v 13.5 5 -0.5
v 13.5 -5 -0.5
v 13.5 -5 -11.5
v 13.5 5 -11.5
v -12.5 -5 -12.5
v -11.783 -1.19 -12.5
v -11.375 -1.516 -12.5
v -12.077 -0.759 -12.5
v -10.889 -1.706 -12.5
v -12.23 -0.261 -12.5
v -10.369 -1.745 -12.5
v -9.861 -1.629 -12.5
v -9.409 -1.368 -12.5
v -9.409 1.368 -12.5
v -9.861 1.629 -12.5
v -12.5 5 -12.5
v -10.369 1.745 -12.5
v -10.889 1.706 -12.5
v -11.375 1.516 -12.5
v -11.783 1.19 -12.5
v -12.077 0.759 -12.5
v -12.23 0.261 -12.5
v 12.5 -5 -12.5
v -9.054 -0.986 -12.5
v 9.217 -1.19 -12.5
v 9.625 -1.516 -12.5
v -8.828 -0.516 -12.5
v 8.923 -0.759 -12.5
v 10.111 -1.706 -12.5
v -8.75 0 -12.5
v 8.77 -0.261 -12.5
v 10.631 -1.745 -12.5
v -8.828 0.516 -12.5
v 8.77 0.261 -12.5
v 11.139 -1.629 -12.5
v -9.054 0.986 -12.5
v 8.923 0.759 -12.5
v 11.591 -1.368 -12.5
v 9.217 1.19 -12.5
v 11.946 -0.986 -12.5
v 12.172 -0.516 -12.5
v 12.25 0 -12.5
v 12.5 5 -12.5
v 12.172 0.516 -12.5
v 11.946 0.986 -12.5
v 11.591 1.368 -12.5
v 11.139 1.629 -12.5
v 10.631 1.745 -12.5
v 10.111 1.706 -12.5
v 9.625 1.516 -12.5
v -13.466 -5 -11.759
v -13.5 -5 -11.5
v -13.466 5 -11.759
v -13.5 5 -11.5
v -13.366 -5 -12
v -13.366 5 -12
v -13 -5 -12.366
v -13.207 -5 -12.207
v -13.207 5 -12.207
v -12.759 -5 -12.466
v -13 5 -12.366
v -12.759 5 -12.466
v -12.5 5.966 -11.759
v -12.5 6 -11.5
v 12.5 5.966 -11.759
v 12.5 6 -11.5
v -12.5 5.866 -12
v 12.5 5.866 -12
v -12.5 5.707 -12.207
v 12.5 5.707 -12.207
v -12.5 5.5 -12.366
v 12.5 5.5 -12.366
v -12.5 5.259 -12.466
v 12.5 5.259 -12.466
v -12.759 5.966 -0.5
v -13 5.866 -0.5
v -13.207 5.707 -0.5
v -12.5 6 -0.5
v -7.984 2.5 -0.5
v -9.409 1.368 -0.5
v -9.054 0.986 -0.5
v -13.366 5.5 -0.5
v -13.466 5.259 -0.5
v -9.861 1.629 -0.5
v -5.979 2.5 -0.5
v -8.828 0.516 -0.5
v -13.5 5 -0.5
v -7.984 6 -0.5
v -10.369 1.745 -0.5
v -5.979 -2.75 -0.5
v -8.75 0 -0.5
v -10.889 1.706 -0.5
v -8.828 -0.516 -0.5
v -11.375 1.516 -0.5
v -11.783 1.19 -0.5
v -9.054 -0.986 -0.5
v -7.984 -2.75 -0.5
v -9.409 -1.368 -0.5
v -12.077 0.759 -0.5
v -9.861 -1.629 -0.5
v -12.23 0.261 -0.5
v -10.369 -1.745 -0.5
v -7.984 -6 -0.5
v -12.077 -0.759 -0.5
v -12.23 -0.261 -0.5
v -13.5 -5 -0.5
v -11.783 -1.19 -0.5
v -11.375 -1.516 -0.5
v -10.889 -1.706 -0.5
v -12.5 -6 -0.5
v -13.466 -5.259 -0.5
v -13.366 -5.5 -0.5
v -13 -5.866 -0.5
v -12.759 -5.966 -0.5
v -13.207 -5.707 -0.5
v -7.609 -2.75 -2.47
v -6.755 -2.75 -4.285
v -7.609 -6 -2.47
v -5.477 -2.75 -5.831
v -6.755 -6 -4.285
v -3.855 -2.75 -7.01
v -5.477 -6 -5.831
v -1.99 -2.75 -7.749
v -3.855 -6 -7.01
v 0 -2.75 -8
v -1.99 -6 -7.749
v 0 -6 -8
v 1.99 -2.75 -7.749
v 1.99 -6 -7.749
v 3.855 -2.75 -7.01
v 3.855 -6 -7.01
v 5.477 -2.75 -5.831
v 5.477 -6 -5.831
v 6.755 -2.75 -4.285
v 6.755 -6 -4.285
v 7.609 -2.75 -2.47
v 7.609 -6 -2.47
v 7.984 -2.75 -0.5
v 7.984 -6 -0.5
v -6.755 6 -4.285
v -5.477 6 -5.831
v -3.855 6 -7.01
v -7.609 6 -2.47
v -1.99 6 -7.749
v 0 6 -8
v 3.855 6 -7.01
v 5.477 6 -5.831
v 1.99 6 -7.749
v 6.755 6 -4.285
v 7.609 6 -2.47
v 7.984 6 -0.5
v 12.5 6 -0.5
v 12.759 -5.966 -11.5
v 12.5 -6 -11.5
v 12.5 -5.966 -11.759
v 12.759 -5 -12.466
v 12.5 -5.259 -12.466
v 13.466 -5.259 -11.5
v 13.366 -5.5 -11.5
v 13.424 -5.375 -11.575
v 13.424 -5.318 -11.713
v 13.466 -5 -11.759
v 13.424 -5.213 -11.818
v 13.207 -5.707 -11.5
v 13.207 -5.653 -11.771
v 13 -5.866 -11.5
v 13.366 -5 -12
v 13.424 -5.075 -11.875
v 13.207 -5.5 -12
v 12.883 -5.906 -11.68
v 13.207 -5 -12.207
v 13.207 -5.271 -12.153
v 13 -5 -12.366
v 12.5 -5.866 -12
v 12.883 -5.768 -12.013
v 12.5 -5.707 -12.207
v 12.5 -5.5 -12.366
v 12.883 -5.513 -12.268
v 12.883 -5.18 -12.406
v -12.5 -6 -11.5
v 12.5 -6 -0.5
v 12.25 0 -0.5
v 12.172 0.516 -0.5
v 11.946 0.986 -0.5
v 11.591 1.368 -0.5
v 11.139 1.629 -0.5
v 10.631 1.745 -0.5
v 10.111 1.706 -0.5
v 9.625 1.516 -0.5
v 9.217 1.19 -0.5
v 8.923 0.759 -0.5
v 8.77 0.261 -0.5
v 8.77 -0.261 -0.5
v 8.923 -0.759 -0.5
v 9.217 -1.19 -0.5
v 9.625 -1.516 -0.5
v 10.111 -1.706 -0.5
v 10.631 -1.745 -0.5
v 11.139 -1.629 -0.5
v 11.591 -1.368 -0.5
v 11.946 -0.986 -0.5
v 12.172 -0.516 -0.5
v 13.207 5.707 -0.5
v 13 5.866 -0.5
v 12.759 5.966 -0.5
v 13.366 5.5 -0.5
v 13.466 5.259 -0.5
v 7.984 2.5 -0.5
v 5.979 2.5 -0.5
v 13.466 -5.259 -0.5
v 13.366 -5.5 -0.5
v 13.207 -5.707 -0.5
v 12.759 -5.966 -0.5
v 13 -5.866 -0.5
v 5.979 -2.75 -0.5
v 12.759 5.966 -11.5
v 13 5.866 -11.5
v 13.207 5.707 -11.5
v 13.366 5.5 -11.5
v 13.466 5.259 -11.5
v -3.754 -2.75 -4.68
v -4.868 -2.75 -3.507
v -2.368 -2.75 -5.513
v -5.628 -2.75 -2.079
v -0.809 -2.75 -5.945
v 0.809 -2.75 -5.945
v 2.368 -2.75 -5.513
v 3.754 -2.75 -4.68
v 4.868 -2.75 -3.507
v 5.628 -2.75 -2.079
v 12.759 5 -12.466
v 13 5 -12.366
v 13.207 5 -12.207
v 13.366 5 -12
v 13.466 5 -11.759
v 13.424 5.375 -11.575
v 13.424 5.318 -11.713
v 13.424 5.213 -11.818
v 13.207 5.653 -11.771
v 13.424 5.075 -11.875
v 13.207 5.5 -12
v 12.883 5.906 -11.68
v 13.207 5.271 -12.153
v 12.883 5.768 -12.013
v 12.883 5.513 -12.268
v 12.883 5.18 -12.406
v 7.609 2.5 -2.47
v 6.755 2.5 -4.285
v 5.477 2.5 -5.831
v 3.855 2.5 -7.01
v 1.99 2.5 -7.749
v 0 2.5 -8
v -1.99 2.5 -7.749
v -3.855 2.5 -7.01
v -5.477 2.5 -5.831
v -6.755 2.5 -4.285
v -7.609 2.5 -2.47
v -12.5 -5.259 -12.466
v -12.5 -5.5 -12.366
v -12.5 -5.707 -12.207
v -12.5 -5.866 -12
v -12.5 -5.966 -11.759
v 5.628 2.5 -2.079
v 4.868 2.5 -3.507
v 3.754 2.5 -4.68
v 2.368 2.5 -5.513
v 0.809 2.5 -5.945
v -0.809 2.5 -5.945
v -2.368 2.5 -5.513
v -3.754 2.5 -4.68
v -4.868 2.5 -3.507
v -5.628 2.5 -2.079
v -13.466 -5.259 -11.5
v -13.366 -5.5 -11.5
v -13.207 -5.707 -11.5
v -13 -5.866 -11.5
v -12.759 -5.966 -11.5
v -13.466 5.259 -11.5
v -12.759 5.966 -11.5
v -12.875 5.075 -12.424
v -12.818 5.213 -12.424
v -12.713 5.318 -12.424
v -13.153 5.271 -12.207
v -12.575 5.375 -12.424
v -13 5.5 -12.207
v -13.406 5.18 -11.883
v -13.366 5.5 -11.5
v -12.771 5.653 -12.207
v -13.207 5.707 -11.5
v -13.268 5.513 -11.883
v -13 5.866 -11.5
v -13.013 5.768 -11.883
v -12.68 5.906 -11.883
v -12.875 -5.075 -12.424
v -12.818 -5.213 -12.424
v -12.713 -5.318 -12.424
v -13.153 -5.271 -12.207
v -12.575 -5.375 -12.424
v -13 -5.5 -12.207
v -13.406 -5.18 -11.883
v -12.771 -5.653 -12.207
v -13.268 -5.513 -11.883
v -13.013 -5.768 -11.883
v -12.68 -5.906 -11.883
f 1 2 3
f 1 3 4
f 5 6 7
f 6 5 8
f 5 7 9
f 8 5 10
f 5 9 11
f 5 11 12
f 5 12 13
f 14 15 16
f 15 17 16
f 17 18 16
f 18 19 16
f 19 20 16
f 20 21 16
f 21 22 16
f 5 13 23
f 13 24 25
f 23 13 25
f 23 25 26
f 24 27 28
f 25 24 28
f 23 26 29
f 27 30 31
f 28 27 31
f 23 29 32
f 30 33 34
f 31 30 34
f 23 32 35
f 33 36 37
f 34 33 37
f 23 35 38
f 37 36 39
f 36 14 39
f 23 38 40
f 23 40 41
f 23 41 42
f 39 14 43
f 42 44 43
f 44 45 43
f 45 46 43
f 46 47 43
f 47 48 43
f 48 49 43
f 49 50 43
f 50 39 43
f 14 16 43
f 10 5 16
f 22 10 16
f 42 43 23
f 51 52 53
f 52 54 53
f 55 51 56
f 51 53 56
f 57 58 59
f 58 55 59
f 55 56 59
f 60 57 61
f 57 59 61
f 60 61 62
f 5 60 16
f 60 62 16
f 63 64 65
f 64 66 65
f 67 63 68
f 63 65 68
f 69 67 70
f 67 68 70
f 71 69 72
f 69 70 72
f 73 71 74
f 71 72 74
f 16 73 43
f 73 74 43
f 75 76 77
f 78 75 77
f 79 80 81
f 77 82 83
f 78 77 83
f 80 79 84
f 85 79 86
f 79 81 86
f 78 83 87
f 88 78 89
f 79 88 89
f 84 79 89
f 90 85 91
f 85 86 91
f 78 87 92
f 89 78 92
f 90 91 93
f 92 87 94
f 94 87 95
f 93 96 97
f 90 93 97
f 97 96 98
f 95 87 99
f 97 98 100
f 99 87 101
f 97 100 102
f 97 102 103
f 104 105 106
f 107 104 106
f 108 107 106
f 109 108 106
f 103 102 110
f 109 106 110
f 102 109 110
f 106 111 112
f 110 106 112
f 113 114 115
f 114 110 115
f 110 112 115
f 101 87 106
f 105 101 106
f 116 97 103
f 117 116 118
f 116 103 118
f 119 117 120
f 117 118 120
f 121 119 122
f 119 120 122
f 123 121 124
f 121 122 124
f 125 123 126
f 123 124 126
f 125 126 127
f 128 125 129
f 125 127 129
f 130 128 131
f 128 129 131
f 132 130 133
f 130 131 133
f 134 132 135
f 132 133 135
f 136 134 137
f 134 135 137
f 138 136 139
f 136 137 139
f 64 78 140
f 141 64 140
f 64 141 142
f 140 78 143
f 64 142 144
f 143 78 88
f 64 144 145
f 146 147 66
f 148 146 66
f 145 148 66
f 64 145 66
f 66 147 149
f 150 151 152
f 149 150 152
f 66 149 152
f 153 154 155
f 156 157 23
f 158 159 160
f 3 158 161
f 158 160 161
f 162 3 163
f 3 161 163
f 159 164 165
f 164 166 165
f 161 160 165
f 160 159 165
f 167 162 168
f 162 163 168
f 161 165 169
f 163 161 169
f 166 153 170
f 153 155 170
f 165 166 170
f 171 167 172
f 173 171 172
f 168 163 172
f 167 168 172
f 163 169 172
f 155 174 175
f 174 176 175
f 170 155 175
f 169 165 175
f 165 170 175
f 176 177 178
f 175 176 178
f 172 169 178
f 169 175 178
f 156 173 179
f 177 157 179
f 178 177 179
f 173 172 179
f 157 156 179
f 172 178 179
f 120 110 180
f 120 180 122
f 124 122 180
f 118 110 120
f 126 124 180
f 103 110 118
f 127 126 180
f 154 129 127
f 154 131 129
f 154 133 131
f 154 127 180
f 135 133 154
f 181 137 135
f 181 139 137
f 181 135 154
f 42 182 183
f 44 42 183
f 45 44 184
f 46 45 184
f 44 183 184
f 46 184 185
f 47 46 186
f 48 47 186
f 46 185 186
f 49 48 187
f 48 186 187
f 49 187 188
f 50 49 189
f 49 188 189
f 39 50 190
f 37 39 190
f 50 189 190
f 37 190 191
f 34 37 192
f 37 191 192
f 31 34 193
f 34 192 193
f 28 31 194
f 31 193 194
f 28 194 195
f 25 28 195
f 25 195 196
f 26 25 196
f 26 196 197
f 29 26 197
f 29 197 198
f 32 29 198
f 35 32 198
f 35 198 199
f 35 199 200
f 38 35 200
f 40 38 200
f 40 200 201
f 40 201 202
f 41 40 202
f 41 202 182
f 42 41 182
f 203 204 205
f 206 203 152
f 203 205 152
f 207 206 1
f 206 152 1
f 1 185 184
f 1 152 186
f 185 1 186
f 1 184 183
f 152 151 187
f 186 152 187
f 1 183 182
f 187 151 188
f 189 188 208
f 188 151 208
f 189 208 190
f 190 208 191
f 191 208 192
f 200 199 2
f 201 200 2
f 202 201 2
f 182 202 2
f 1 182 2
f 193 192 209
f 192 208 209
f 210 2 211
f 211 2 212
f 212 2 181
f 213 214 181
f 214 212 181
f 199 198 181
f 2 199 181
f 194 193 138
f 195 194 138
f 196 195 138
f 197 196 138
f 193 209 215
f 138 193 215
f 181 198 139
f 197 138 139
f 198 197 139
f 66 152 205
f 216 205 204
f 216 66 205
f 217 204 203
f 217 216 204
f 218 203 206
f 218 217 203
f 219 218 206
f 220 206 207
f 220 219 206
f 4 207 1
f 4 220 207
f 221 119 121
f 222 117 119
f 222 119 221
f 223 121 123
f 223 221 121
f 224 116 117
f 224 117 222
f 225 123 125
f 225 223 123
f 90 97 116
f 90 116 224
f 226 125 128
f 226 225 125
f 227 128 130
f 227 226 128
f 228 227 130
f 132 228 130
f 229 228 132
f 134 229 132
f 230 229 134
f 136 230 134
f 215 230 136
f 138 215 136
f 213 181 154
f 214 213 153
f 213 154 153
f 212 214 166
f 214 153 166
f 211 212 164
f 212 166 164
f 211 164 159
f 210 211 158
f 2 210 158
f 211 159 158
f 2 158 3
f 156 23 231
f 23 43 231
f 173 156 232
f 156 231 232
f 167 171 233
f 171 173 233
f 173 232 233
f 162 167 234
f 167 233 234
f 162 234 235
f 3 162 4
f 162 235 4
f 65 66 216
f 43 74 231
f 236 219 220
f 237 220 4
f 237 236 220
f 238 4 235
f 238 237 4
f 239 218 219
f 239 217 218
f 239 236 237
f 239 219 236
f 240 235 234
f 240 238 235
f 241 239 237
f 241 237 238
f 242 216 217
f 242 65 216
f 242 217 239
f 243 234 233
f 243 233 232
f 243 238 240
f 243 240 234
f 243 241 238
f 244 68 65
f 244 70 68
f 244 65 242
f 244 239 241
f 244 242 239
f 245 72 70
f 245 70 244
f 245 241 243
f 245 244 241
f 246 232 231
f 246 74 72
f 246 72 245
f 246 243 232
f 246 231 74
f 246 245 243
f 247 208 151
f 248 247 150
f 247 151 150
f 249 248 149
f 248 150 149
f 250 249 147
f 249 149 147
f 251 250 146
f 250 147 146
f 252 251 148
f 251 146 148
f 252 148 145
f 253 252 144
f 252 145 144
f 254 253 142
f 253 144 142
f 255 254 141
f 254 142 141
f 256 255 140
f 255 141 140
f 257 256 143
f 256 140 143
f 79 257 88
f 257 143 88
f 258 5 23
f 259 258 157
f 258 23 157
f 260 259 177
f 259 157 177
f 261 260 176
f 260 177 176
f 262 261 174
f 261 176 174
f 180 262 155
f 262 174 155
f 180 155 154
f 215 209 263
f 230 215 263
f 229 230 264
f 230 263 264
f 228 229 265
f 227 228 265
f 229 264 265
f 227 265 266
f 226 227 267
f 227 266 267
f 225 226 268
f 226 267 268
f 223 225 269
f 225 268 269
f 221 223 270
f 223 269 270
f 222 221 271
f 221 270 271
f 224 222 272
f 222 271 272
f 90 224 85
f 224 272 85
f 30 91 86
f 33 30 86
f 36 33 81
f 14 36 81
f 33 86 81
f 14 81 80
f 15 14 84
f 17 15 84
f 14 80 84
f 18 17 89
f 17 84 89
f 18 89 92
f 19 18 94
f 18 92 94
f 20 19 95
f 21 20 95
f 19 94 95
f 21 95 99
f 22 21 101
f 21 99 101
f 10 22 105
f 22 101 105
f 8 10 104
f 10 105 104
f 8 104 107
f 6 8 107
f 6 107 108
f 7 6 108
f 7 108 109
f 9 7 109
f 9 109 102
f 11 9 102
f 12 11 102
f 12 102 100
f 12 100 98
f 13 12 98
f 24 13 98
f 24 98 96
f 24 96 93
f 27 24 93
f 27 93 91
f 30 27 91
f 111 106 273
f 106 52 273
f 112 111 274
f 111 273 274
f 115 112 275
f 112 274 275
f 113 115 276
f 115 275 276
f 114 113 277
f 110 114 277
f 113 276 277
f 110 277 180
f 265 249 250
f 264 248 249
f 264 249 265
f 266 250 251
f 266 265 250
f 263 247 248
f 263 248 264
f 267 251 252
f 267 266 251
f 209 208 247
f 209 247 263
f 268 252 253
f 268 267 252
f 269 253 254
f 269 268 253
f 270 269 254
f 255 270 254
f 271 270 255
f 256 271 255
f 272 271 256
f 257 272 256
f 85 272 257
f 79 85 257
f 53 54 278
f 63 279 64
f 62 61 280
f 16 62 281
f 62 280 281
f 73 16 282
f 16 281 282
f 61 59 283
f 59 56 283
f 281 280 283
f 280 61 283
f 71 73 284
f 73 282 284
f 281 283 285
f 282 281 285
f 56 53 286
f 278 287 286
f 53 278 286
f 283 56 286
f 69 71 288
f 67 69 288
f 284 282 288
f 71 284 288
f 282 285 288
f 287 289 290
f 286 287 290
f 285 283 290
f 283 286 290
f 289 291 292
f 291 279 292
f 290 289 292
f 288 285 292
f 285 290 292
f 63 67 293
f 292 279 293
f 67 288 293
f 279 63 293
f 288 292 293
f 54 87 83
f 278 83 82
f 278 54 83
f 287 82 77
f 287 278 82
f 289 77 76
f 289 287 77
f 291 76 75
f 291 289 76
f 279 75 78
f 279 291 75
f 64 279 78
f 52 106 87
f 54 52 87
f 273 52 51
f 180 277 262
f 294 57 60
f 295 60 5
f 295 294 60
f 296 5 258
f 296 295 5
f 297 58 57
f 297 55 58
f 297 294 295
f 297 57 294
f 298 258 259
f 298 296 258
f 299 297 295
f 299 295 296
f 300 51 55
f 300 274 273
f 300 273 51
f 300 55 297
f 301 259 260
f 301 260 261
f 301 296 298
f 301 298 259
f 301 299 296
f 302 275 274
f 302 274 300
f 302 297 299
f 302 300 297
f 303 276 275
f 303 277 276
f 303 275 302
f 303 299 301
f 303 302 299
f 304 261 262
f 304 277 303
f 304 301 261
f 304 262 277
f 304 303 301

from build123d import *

# Parameters (mm, degrees)
F0_W      = 27
F0_H      = 12
F1_DEPTH  = 12.5
F3_DEPTH  = 3.25
F5_DEPTH  = 3.5
F6_R      = 6
F7_DEPTH  = 25
F8_R      = 1.75
F9_DEPTH  = 25
F10_W     = 12
F10_H     = 0.5
F11_DEPTH = 31
F12_R     = 1


with BuildPart() as f1:
    # F0 (on Top) → F1 (new body)
    with BuildSketch(Plane.XY):
        Rectangle(F0_W, F0_H)
    extrude(amount=-F1_DEPTH)

    # F2 (on face) → F3 (cut)
    with BuildSketch(Plane.XZ.offset(6)):
        with BuildLine():
            Line((8, 0), (-8, 0))
            ThreePointArc((-8, 0), (0, -8), (8, 0))
        make_face()
    extrude(amount=-F3_DEPTH, mode=Mode.SUBTRACT)

    # F4 (on face) → F5 (cut)
    with BuildSketch(Plane(origin=(0, 6, 0), x_dir=(-1, 0, 0), z_dir=(0, 1, 0))):
        with BuildLine():
            Line((8, 0), (-8, 0))
            ThreePointArc((-8, 0), (0, -8), (8, 0))
        make_face()
    extrude(amount=-F5_DEPTH, mode=Mode.SUBTRACT)

    # F6 (on face) → F7 (cut)
    with BuildSketch(Plane(origin=(0, 2.5, 0), x_dir=(-1, 0, 0), z_dir=(0, 1, 0))):
        Circle(F6_R)
    extrude(amount=-F7_DEPTH, mode=Mode.SUBTRACT)

    # F8 (on face) → F9 (cut)
    with BuildSketch(Plane.XY):
        with Locations((10.5, 0)):
            Circle(F8_R)
        with Locations((-10.5, 0)):
            Circle(F8_R)
    extrude(amount=-F9_DEPTH, mode=Mode.SUBTRACT)

    # F10 (on face) → F11 (cut)
    with BuildSketch(Plane(origin=(-13.5, 0, 0), x_dir=(0, -1, 0), z_dir=(-1, 0, 0))):
        with Locations((0, -0.25)):
            Rectangle(F10_W, F10_H)
    extrude(amount=-F11_DEPTH, mode=Mode.SUBTRACT)

    # F12
    f12_edges = [f1.edges().sort_by_distance(p)[0] for p in [
        (-13.5, -6, -6.5),
        (-13.5, 6, -6.5),
        (-13.5, 0, -12.5),
        (0, -6, -12.5),
        (0, 6, -12.5),
        (13.5, -6, -6.5),
        (13.5, 6, -6.5),
        (13.5, 0, -12.5),
    ]]
    fillet(f12_edges, radius=F12_R)


solid = f1.part
